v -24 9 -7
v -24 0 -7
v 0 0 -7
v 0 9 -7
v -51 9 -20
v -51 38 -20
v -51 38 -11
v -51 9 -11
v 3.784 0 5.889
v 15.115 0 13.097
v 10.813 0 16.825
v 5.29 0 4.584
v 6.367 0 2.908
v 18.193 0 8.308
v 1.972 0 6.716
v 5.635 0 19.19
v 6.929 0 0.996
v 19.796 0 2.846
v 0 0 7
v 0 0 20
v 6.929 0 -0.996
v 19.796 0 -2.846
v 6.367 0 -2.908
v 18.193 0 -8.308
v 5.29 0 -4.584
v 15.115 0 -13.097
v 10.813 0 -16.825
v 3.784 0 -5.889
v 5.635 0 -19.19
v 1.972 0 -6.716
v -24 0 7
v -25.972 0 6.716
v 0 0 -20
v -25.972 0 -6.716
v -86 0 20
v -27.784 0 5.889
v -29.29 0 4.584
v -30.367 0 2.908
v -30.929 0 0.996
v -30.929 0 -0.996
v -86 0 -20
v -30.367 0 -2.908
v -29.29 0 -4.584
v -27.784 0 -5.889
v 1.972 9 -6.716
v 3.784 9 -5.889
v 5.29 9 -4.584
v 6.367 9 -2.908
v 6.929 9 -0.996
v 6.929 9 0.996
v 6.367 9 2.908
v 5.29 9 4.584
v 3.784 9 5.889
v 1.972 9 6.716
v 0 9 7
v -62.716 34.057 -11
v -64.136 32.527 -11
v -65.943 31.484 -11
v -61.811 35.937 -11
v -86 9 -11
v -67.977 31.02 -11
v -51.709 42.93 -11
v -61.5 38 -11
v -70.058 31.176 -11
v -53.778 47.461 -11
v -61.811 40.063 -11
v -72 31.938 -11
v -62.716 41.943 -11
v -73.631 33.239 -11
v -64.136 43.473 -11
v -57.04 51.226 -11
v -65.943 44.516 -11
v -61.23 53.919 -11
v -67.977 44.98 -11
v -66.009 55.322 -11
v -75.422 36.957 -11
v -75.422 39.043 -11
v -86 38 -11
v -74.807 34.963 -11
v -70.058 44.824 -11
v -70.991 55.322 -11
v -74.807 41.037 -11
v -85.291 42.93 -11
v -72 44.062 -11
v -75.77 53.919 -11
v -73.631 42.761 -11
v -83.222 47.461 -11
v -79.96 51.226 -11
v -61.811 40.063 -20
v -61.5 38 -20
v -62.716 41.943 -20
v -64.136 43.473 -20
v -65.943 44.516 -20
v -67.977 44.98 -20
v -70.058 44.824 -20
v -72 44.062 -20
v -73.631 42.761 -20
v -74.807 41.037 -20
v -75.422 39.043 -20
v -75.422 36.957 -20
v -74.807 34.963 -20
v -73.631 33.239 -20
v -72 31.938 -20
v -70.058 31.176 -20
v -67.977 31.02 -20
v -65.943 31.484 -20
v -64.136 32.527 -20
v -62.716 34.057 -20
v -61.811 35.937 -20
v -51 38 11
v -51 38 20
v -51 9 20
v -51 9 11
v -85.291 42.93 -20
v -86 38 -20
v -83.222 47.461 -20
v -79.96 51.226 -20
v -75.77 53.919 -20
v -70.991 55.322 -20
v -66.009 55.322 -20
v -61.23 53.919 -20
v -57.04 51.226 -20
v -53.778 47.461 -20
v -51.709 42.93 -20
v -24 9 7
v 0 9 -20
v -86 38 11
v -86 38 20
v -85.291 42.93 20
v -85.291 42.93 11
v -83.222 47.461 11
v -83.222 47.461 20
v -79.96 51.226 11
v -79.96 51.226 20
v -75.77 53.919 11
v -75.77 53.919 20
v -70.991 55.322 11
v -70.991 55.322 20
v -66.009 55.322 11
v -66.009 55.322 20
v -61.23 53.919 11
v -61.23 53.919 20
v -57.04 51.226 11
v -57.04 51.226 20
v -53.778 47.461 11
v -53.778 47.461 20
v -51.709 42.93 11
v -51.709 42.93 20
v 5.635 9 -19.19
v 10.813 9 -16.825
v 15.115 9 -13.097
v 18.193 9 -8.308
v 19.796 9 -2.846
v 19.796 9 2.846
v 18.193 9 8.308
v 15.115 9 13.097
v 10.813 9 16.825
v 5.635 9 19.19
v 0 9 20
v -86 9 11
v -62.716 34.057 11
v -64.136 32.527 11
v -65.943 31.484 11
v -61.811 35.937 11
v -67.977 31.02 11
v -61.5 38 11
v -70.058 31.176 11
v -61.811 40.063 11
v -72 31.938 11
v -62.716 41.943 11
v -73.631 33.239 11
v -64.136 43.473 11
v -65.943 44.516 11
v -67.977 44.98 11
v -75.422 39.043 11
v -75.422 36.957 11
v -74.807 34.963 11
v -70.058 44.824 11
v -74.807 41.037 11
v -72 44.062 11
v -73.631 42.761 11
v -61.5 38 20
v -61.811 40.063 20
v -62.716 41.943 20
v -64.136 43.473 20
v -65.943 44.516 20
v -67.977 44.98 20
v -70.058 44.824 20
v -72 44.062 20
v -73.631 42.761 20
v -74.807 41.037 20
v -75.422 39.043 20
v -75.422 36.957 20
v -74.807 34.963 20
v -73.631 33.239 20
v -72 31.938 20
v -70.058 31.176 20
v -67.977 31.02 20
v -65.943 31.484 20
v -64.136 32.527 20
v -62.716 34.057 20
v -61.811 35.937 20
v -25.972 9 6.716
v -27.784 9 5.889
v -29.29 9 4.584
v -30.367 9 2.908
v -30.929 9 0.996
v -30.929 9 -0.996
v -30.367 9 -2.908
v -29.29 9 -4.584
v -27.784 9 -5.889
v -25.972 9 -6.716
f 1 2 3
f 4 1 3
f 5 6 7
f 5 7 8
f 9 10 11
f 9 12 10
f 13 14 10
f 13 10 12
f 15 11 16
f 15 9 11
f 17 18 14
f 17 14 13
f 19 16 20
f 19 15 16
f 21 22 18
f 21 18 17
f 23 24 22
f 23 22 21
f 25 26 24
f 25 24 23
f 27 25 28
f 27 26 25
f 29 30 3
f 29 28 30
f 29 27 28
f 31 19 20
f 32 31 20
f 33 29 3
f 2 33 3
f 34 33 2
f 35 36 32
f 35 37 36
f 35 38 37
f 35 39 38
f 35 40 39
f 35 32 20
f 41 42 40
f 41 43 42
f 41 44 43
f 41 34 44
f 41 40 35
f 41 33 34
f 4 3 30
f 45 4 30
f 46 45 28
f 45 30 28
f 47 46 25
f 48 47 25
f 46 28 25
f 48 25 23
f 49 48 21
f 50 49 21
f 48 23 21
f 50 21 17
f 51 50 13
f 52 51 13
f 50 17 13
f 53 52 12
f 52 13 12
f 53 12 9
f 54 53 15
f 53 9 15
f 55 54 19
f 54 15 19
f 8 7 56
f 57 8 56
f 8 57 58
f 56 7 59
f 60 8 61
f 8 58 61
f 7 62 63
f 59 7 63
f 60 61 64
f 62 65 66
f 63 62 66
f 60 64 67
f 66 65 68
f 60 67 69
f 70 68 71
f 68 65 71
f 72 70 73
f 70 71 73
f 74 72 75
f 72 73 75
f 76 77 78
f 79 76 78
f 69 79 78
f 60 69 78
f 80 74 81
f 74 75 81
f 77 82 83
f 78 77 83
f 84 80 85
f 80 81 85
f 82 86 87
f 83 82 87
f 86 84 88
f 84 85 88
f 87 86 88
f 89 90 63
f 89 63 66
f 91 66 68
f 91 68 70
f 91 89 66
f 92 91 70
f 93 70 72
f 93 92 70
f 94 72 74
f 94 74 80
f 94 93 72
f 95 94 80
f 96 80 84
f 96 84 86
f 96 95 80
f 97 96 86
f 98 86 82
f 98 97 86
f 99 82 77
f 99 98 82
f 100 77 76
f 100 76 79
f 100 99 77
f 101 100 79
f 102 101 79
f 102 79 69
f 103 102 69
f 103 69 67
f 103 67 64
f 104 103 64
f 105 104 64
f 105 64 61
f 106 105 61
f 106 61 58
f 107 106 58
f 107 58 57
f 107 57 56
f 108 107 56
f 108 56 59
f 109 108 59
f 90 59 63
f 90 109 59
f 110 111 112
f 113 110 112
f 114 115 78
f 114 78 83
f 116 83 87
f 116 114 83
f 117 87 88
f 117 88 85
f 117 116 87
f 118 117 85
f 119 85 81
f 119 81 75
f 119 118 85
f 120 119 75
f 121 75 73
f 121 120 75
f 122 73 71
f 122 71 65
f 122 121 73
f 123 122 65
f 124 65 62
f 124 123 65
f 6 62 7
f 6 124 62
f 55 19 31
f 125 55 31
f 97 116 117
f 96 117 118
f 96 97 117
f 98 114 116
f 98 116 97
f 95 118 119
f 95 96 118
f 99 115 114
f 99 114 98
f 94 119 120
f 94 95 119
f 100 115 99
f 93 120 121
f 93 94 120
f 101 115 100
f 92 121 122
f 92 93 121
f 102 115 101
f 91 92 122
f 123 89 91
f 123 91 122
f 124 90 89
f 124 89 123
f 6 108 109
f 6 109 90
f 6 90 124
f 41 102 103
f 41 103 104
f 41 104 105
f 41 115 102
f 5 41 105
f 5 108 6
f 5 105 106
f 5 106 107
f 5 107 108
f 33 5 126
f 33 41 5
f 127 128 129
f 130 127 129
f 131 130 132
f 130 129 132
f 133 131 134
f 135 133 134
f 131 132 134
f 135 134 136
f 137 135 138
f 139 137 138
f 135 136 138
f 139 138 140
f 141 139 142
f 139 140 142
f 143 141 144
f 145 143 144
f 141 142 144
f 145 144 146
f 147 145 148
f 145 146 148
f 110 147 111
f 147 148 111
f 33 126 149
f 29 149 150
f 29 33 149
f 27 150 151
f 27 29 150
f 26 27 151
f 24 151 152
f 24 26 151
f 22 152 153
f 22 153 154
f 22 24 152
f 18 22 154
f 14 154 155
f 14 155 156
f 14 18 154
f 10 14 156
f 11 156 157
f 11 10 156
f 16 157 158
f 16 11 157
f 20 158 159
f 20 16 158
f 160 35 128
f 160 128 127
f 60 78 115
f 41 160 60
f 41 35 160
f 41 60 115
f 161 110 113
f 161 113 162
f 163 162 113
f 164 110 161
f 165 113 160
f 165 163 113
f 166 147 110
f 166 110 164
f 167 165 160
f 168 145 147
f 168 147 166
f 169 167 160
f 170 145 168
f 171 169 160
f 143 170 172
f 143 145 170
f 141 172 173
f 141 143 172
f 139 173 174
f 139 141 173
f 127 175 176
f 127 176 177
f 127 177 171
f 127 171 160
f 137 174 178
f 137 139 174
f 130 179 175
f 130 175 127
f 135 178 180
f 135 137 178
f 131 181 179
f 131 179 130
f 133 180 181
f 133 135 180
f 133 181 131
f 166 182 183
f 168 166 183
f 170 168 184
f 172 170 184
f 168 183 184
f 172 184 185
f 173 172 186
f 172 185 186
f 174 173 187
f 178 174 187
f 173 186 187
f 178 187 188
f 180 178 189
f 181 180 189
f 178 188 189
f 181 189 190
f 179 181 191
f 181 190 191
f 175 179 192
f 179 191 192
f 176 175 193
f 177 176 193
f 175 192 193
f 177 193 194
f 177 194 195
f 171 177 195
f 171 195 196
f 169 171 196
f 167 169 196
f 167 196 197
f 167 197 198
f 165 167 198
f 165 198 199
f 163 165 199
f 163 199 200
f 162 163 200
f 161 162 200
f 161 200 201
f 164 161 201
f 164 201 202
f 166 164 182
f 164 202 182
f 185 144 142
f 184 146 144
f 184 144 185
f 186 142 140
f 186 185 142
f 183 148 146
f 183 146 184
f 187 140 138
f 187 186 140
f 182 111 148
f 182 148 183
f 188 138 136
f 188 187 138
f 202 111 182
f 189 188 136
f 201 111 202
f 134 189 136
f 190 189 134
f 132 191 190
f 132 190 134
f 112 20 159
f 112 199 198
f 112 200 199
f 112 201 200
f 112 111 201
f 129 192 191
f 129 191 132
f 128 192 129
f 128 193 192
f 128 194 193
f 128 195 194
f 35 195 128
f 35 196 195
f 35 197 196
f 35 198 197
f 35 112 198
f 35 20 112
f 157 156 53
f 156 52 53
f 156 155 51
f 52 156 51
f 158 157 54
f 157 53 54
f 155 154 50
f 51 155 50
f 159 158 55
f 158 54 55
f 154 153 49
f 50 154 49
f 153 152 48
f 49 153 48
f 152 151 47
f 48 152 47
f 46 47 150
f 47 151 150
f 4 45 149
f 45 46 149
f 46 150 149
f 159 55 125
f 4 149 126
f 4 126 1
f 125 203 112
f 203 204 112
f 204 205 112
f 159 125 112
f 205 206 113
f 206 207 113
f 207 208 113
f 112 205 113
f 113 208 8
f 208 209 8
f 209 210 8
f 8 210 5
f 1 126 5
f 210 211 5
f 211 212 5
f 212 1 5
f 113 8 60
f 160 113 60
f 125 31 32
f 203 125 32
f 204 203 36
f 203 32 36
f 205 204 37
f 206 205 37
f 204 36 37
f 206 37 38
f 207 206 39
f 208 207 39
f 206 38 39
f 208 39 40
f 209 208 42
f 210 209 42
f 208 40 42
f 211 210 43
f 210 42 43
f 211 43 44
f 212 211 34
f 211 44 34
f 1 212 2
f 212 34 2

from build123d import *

# Parameters (mm, degrees)
BOSS_EXTRUDE1_DEPTH = 9
SKETCH4_R           = 7
BOSS_EXTRUDE2_DEPTH = 9


with BuildPart() as part:
    # Sketch2 → Boss-Extrude1 (new body)
    with BuildSketch(Plane(origin=(0, 0, 0), x_dir=(1, 0, 0), z_dir=(0, 1, 0))):
        with BuildLine():
            Line((0, -20), (-86, -20))
            Line((-86, -20), (-86, 20))
            Line((-86, 20), (0, 20))
            ThreePointArc((0, 20), (20, 0), (0, -20))
        make_face()
        with BuildLine():
            Line((-24, 7), (0, 7))
            ThreePointArc((0, 7), (7, 0), (0, -7))
            Line((0, -7), (-24, -7))
            ThreePointArc((-24, -7), (-31, 0), (-24, 7))
        make_face(mode=Mode.SUBTRACT)
    extrude(amount=BOSS_EXTRUDE1_DEPTH)

    # Sketch4 → Boss-Extrude2 (add)
    with BuildSketch(Plane.XY.offset(20)):
        with BuildLine():
            Line((-86, 0), (-86, 38))
            ThreePointArc((-86, 38), (-68.5, 55.5), (-51, 38))
            Line((-51, 38), (-51, 0))
            Line((-51, 0), (-86, 0))
        make_face()
        with Locations((-68.5, 38)):
            Circle(SKETCH4_R, mode=Mode.SUBTRACT)
    boss_extrude2 = extrude(amount=-BOSS_EXTRUDE2_DEPTH)

    # Mirror1: Boss-Extrude2 across plane
    add(boss_extrude2.mirror(Plane.XY))


solid = part.part
